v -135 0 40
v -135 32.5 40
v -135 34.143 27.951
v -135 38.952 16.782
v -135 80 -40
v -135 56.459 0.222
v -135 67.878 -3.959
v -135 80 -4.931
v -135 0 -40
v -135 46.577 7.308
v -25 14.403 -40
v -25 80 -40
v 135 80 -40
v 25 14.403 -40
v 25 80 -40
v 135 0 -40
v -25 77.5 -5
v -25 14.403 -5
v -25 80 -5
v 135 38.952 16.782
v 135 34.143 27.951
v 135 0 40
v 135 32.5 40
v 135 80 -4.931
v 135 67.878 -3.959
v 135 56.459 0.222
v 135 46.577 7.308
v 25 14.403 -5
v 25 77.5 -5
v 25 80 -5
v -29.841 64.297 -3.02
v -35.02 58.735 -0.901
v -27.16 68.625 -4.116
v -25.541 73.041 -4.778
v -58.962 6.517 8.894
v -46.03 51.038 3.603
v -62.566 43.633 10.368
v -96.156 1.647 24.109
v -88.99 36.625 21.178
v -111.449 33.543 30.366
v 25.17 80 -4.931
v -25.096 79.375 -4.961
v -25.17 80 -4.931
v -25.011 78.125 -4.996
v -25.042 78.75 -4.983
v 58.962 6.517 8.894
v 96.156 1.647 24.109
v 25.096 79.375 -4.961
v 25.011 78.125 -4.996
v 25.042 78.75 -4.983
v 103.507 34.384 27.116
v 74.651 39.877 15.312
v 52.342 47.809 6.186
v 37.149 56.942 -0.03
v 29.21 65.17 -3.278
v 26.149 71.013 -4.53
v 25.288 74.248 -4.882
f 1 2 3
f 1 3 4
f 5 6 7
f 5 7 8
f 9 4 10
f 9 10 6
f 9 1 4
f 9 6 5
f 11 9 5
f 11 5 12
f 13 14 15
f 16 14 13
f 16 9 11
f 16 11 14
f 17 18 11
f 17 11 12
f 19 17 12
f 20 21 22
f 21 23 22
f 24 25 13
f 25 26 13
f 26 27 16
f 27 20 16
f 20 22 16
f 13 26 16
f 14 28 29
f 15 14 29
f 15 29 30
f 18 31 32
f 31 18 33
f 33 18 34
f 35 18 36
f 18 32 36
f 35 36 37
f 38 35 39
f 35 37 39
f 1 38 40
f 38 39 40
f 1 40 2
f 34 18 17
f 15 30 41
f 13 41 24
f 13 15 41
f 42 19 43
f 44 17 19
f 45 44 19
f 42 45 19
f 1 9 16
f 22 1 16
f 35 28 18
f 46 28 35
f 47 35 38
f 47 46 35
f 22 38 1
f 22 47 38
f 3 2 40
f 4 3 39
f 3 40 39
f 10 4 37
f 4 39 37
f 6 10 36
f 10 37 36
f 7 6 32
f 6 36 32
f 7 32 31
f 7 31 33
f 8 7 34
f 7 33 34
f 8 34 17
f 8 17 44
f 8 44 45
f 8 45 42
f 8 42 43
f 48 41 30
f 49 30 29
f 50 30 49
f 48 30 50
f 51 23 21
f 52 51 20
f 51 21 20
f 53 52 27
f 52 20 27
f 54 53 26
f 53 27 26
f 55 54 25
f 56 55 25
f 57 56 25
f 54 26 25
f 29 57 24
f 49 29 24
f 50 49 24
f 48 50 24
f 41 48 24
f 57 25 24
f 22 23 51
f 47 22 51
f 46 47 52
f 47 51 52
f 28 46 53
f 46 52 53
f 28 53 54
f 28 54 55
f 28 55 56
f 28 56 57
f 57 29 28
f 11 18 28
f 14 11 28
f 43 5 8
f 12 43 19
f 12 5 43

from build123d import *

# Parameters (mm, degrees)
SKETCH1_W           = 270
SKETCH1_H           = 80
BOSS_EXTRUDE1_DEPTH = 80
CUT_EXTRUDE1_DEPTH  = 81
BOSS_EXTRUDE2_DEPTH = 270
SKETCH3_R           = 45
CUT_EXTRUDE2_DEPTH  = 271
SKETCH5_W           = 50
SKETCH5_H           = 65.597147321
CUT_EXTRUDE3_DEPTH  = 36


with BuildPart() as part:
    # Sketch1 → Boss-Extrude1 (new body)
    with BuildSketch(Plane(origin=(0, 0, 0), x_dir=(1, 0, 0), z_dir=(0, 1, 0))):
        Rectangle(SKETCH1_W, SKETCH1_H)
    extrude(amount=BOSS_EXTRUDE1_DEPTH)

    # Sketch2 → Cut-Extrude1 (cut, through all)
    with BuildSketch(Plane(origin=(0, 80, 0), x_dir=(1, 0, 0), z_dir=(0, 1, 0))):
        Polygon((0, -40), (0, 5), (-25, 5), (-135, -40), align=None)
        Polygon((135, -40), (25, 5), (0, 5), (0, -40), align=None)
    extrude(amount=-CUT_EXTRUDE1_DEPTH, mode=Mode.SUBTRACT)

    # Sketch4 → Boss-Extrude2 (add)
    with BuildSketch(Plane(origin=(135, 0, 0), x_dir=(0, 0, -1), z_dir=(1, 0, 0))):
        with BuildLine():
            Line((40, 80), (37.459666924, 80))
            ThreePointArc((37.459666924, 80), (15.677643628, 23.590353368), (-40, 0))
            Line((-40, 0), (40, 0))
            Line((40, 0), (40, 80))
        make_face()
    extrude(amount=-BOSS_EXTRUDE2_DEPTH)

    # Sketch3 → Cut-Extrude2 (cut, through all)
    with BuildSketch(Plane(origin=(135, 0, 0), x_dir=(0, 0, -1), z_dir=(1, 0, 0))):
        with Locations((-40, 77.5)):
            Circle(SKETCH3_R)
    extrude(amount=-CUT_EXTRUDE2_DEPTH, mode=Mode.SUBTRACT)

    # Sketch5 → Cut-Extrude3 (cut, through all)
    with BuildSketch(Plane.XY.offset(-5)):
        with Locations((0, 47.20142634)):
            Rectangle(SKETCH5_W, SKETCH5_H)
    extrude(amount=-CUT_EXTRUDE3_DEPTH, mode=Mode.SUBTRACT)


solid = part.part
